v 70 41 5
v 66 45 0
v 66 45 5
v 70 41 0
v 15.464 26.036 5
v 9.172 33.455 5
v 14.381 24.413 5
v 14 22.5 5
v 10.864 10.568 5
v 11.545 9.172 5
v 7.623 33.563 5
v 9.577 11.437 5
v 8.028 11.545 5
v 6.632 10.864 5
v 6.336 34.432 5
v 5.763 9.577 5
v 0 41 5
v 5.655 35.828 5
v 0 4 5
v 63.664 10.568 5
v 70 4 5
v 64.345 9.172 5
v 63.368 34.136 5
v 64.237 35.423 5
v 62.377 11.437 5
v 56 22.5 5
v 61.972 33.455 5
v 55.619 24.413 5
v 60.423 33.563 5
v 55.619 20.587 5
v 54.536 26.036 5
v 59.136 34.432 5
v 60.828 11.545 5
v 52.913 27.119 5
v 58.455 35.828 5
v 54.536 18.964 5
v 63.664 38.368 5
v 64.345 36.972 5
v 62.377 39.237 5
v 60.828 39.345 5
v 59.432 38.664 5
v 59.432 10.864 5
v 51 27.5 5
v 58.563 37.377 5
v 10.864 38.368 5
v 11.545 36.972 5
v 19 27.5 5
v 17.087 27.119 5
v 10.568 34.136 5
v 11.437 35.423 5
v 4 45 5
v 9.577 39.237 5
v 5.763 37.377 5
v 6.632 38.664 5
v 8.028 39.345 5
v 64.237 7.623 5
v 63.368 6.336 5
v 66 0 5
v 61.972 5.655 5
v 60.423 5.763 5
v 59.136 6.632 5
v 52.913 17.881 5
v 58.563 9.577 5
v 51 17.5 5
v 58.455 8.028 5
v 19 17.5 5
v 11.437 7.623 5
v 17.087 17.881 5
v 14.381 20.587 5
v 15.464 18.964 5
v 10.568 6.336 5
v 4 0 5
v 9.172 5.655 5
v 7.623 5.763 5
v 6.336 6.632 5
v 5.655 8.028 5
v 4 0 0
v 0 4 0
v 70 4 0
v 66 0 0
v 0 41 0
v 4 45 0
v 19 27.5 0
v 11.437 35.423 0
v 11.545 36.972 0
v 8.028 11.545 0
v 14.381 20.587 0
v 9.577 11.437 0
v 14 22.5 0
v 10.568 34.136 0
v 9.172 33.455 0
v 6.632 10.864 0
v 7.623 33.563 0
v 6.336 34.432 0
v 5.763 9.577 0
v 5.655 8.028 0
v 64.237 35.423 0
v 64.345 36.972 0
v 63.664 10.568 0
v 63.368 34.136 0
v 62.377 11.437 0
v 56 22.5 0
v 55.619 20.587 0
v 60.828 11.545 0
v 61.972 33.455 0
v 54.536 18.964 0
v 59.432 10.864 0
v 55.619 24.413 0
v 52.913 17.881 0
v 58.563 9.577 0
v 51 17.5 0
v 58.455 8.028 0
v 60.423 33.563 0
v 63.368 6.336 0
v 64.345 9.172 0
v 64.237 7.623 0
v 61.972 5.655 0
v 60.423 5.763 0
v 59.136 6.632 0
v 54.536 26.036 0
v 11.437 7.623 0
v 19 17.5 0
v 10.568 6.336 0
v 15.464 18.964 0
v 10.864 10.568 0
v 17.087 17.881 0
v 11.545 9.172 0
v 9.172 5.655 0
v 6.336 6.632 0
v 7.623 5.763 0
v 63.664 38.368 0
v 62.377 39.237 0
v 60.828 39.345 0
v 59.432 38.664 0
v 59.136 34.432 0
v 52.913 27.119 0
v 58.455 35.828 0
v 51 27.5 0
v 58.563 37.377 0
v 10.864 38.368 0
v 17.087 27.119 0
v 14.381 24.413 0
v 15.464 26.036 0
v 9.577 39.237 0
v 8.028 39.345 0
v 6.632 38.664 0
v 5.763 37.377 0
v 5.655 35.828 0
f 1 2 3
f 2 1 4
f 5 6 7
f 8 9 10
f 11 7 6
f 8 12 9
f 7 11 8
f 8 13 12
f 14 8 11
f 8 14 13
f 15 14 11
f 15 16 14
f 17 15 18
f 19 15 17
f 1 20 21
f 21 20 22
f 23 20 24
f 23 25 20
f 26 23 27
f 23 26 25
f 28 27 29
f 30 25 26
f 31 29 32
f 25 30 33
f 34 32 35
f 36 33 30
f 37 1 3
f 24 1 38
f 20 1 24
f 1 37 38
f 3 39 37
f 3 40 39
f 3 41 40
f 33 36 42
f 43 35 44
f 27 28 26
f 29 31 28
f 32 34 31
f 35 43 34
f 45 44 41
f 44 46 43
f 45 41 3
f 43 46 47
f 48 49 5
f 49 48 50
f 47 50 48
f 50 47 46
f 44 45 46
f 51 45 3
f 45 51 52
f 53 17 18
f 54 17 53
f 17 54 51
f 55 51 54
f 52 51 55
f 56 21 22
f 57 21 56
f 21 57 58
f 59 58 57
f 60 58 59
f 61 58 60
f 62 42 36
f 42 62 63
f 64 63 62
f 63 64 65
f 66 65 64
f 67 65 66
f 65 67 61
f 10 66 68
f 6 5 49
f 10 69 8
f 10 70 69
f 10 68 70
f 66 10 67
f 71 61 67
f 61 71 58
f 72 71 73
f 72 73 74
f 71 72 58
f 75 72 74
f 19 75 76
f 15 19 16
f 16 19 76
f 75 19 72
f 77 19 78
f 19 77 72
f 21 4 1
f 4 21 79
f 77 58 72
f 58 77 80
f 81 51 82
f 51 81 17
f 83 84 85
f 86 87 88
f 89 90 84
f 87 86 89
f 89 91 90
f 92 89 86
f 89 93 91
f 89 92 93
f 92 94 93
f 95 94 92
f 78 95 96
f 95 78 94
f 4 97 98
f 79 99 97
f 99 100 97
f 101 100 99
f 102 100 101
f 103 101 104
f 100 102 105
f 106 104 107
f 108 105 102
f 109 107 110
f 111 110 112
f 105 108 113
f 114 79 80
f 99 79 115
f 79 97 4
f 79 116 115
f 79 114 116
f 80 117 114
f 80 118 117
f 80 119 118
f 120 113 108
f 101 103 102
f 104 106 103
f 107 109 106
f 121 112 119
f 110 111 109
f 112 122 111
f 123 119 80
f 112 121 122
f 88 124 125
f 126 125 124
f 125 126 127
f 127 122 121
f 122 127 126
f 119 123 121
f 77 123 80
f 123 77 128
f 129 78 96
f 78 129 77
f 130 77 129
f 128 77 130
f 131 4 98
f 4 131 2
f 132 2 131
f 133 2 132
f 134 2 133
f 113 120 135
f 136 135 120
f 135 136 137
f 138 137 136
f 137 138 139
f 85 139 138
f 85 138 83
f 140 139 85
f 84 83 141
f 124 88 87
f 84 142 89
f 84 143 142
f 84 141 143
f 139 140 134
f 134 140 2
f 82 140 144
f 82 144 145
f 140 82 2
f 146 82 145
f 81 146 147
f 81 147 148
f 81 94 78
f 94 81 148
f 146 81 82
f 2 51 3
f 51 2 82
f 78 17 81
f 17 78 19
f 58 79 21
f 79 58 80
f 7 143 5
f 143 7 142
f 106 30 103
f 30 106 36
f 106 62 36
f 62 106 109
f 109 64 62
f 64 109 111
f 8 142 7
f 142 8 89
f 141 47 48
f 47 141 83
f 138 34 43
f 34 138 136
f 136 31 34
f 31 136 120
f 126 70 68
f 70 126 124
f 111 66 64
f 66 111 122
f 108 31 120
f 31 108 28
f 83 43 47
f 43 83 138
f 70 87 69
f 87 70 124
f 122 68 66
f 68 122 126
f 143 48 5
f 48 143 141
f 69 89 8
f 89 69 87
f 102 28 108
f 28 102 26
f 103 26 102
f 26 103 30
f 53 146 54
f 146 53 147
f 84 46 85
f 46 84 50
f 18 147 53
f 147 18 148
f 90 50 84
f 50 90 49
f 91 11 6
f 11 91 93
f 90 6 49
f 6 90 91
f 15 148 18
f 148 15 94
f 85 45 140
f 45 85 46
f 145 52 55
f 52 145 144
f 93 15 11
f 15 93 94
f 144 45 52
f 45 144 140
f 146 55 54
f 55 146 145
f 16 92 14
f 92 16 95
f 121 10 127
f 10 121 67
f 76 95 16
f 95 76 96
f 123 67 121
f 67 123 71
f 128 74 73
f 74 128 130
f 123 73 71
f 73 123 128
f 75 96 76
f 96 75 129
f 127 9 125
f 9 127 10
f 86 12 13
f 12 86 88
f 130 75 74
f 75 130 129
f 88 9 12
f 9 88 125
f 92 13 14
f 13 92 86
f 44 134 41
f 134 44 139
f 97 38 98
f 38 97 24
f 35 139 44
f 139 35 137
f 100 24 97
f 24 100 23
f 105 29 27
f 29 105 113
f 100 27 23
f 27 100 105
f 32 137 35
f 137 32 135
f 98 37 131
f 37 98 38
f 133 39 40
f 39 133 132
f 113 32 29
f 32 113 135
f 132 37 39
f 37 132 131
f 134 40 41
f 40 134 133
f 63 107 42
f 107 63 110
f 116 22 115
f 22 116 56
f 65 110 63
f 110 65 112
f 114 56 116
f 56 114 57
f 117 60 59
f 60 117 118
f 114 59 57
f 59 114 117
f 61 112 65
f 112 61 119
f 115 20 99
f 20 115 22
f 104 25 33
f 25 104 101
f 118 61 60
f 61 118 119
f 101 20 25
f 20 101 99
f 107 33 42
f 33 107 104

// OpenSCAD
$fn = 32;

// ----------------------------------------------------------------------
// Bracket plate: slot plate 70 x 45
// ----------------------------------------------------------------------

// --- parameters (mm) ---
hole_r = 3;               // bolt hole radius
plate_t = 5;              // plate thickness, Z (extrusion height)
plate_l = 70;             // plate length
plate_w = 45;             // plate width
slot_l = 32;              // slot straight length
slot_r = 5;               // slot end radius

slot_len = slot_l + 2 * slot_r;
slot_w = 2 * slot_r;
hole_d2 = 2 * hole_r;

profile = [[4, 0], [66, 0], [70, 4], [70, 41], [66, 45], [4, 45], [0, 41], [0, 4]];  // primary outline, 8 points, counter clockwise
void_1 = [[51, 17.5], [52.913, 17.881], [54.536, 18.964], [55.619, 20.587], [56, 22.5], [55.619, 24.413], [54.536, 26.036], [52.913, 27.119], [51, 27.5], [19, 27.5], [17.087, 27.119], [15.464, 26.036], [14.381, 24.413], [14, 22.5], [14.381, 20.587], [15.464, 18.964], [17.087, 17.881], [19, 17.5]];  // grip slot, 18 points
void_2 = [[11.545, 36.972], [10.864, 38.368], [9.577, 39.237], [8.028, 39.345], [6.632, 38.664], [5.763, 37.377], [5.655, 35.828], [6.336, 34.432], [7.623, 33.563], [9.172, 33.455], [10.568, 34.136], [11.437, 35.423]];  // corner hole, 12 points
void_3 = [[11.545, 9.172], [10.864, 10.568], [9.577, 11.437], [8.028, 11.545], [6.632, 10.864], [5.763, 9.577], [5.655, 8.028], [6.336, 6.632], [7.623, 5.763], [9.172, 5.655], [10.568, 6.336], [11.437, 7.623]];  // corner hole, 12 points
void_4 = [[64.345, 36.972], [63.664, 38.368], [62.377, 39.237], [60.828, 39.345], [59.432, 38.664], [58.563, 37.377], [58.455, 35.828], [59.136, 34.432], [60.423, 33.563], [61.972, 33.455], [63.368, 34.136], [64.237, 35.423]];  // corner hole, 12 points
void_5 = [[64.345, 9.172], [63.664, 10.568], [62.377, 11.437], [60.828, 11.545], [59.432, 10.864], [58.563, 9.577], [58.455, 8.028], [59.136, 6.632], [60.423, 5.763], [61.972, 5.655], [63.368, 6.336], [64.237, 7.623]];  // corner hole, 12 points

// --- the one profile operation ---
difference() {
  linear_extrude(height = plate_t) polygon(points = profile);
  translate([0, 0, -1])
    linear_extrude(height = plate_t + 2) polygon(points = void_1);
  translate([0, 0, -1])
    linear_extrude(height = plate_t + 2) polygon(points = void_2);
  translate([0, 0, -1])
    linear_extrude(height = plate_t + 2) polygon(points = void_3);
  translate([0, 0, -1])
    linear_extrude(height = plate_t + 2) polygon(points = void_4);
  translate([0, 0, -1])
    linear_extrude(height = plate_t + 2) polygon(points = void_5);
}
